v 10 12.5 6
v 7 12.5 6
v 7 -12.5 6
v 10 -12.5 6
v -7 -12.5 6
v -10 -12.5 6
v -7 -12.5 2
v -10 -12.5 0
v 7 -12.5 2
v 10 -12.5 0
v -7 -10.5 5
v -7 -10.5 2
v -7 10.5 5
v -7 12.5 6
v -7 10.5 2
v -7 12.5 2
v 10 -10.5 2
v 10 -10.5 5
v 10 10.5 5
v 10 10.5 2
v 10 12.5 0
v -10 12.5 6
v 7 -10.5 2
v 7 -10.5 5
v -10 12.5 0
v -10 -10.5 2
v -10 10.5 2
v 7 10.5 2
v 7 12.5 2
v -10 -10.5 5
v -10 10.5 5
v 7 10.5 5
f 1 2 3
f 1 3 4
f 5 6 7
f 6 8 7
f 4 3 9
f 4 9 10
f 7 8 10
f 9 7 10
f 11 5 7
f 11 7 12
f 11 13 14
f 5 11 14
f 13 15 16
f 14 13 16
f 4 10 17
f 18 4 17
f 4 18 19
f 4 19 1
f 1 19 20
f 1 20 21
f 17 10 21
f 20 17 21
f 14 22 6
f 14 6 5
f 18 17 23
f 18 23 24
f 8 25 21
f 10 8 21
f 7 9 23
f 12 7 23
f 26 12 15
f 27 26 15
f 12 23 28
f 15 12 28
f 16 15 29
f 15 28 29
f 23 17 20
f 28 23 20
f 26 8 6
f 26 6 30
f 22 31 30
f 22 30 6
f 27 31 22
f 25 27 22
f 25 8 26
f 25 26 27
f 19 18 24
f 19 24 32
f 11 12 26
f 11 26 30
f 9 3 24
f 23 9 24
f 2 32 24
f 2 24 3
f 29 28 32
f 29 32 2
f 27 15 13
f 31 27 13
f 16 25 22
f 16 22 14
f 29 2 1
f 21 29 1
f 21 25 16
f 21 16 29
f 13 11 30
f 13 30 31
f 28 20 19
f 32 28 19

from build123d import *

# Parameters (mm, degrees)
F0_W     = 20
F0_H     = 25
F1_DEPTH = 2
F2_W     = 3
F2_H     = 25
F3_DEPTH = 4
F4_W     = 21
F4_H     = 3
F5_DEPTH = 25


with BuildPart() as f1:
    # F0 (on Top) → F1 (new body)
    with BuildSketch(Plane.XY):
        Rectangle(F0_W, F0_H)
    extrude(amount=F1_DEPTH)

    # F2 (on face) → F3 (join)
    with BuildSketch(Plane.XY.offset(2)):
        with Locations((-8.5, 0)):
            Rectangle(F2_W, F2_H)
        with Locations((8.5, 0)):
            Rectangle(F2_W, F2_H)
    extrude(amount=F3_DEPTH)

    # F4 (on face) → F5 (cut)
    with BuildSketch(Plane.YZ.offset(10)):
        with Locations((0, 3.5)):
            Rectangle(F4_W, F4_H)
    extrude(amount=-F5_DEPTH, mode=Mode.SUBTRACT)


solid = f1.part
